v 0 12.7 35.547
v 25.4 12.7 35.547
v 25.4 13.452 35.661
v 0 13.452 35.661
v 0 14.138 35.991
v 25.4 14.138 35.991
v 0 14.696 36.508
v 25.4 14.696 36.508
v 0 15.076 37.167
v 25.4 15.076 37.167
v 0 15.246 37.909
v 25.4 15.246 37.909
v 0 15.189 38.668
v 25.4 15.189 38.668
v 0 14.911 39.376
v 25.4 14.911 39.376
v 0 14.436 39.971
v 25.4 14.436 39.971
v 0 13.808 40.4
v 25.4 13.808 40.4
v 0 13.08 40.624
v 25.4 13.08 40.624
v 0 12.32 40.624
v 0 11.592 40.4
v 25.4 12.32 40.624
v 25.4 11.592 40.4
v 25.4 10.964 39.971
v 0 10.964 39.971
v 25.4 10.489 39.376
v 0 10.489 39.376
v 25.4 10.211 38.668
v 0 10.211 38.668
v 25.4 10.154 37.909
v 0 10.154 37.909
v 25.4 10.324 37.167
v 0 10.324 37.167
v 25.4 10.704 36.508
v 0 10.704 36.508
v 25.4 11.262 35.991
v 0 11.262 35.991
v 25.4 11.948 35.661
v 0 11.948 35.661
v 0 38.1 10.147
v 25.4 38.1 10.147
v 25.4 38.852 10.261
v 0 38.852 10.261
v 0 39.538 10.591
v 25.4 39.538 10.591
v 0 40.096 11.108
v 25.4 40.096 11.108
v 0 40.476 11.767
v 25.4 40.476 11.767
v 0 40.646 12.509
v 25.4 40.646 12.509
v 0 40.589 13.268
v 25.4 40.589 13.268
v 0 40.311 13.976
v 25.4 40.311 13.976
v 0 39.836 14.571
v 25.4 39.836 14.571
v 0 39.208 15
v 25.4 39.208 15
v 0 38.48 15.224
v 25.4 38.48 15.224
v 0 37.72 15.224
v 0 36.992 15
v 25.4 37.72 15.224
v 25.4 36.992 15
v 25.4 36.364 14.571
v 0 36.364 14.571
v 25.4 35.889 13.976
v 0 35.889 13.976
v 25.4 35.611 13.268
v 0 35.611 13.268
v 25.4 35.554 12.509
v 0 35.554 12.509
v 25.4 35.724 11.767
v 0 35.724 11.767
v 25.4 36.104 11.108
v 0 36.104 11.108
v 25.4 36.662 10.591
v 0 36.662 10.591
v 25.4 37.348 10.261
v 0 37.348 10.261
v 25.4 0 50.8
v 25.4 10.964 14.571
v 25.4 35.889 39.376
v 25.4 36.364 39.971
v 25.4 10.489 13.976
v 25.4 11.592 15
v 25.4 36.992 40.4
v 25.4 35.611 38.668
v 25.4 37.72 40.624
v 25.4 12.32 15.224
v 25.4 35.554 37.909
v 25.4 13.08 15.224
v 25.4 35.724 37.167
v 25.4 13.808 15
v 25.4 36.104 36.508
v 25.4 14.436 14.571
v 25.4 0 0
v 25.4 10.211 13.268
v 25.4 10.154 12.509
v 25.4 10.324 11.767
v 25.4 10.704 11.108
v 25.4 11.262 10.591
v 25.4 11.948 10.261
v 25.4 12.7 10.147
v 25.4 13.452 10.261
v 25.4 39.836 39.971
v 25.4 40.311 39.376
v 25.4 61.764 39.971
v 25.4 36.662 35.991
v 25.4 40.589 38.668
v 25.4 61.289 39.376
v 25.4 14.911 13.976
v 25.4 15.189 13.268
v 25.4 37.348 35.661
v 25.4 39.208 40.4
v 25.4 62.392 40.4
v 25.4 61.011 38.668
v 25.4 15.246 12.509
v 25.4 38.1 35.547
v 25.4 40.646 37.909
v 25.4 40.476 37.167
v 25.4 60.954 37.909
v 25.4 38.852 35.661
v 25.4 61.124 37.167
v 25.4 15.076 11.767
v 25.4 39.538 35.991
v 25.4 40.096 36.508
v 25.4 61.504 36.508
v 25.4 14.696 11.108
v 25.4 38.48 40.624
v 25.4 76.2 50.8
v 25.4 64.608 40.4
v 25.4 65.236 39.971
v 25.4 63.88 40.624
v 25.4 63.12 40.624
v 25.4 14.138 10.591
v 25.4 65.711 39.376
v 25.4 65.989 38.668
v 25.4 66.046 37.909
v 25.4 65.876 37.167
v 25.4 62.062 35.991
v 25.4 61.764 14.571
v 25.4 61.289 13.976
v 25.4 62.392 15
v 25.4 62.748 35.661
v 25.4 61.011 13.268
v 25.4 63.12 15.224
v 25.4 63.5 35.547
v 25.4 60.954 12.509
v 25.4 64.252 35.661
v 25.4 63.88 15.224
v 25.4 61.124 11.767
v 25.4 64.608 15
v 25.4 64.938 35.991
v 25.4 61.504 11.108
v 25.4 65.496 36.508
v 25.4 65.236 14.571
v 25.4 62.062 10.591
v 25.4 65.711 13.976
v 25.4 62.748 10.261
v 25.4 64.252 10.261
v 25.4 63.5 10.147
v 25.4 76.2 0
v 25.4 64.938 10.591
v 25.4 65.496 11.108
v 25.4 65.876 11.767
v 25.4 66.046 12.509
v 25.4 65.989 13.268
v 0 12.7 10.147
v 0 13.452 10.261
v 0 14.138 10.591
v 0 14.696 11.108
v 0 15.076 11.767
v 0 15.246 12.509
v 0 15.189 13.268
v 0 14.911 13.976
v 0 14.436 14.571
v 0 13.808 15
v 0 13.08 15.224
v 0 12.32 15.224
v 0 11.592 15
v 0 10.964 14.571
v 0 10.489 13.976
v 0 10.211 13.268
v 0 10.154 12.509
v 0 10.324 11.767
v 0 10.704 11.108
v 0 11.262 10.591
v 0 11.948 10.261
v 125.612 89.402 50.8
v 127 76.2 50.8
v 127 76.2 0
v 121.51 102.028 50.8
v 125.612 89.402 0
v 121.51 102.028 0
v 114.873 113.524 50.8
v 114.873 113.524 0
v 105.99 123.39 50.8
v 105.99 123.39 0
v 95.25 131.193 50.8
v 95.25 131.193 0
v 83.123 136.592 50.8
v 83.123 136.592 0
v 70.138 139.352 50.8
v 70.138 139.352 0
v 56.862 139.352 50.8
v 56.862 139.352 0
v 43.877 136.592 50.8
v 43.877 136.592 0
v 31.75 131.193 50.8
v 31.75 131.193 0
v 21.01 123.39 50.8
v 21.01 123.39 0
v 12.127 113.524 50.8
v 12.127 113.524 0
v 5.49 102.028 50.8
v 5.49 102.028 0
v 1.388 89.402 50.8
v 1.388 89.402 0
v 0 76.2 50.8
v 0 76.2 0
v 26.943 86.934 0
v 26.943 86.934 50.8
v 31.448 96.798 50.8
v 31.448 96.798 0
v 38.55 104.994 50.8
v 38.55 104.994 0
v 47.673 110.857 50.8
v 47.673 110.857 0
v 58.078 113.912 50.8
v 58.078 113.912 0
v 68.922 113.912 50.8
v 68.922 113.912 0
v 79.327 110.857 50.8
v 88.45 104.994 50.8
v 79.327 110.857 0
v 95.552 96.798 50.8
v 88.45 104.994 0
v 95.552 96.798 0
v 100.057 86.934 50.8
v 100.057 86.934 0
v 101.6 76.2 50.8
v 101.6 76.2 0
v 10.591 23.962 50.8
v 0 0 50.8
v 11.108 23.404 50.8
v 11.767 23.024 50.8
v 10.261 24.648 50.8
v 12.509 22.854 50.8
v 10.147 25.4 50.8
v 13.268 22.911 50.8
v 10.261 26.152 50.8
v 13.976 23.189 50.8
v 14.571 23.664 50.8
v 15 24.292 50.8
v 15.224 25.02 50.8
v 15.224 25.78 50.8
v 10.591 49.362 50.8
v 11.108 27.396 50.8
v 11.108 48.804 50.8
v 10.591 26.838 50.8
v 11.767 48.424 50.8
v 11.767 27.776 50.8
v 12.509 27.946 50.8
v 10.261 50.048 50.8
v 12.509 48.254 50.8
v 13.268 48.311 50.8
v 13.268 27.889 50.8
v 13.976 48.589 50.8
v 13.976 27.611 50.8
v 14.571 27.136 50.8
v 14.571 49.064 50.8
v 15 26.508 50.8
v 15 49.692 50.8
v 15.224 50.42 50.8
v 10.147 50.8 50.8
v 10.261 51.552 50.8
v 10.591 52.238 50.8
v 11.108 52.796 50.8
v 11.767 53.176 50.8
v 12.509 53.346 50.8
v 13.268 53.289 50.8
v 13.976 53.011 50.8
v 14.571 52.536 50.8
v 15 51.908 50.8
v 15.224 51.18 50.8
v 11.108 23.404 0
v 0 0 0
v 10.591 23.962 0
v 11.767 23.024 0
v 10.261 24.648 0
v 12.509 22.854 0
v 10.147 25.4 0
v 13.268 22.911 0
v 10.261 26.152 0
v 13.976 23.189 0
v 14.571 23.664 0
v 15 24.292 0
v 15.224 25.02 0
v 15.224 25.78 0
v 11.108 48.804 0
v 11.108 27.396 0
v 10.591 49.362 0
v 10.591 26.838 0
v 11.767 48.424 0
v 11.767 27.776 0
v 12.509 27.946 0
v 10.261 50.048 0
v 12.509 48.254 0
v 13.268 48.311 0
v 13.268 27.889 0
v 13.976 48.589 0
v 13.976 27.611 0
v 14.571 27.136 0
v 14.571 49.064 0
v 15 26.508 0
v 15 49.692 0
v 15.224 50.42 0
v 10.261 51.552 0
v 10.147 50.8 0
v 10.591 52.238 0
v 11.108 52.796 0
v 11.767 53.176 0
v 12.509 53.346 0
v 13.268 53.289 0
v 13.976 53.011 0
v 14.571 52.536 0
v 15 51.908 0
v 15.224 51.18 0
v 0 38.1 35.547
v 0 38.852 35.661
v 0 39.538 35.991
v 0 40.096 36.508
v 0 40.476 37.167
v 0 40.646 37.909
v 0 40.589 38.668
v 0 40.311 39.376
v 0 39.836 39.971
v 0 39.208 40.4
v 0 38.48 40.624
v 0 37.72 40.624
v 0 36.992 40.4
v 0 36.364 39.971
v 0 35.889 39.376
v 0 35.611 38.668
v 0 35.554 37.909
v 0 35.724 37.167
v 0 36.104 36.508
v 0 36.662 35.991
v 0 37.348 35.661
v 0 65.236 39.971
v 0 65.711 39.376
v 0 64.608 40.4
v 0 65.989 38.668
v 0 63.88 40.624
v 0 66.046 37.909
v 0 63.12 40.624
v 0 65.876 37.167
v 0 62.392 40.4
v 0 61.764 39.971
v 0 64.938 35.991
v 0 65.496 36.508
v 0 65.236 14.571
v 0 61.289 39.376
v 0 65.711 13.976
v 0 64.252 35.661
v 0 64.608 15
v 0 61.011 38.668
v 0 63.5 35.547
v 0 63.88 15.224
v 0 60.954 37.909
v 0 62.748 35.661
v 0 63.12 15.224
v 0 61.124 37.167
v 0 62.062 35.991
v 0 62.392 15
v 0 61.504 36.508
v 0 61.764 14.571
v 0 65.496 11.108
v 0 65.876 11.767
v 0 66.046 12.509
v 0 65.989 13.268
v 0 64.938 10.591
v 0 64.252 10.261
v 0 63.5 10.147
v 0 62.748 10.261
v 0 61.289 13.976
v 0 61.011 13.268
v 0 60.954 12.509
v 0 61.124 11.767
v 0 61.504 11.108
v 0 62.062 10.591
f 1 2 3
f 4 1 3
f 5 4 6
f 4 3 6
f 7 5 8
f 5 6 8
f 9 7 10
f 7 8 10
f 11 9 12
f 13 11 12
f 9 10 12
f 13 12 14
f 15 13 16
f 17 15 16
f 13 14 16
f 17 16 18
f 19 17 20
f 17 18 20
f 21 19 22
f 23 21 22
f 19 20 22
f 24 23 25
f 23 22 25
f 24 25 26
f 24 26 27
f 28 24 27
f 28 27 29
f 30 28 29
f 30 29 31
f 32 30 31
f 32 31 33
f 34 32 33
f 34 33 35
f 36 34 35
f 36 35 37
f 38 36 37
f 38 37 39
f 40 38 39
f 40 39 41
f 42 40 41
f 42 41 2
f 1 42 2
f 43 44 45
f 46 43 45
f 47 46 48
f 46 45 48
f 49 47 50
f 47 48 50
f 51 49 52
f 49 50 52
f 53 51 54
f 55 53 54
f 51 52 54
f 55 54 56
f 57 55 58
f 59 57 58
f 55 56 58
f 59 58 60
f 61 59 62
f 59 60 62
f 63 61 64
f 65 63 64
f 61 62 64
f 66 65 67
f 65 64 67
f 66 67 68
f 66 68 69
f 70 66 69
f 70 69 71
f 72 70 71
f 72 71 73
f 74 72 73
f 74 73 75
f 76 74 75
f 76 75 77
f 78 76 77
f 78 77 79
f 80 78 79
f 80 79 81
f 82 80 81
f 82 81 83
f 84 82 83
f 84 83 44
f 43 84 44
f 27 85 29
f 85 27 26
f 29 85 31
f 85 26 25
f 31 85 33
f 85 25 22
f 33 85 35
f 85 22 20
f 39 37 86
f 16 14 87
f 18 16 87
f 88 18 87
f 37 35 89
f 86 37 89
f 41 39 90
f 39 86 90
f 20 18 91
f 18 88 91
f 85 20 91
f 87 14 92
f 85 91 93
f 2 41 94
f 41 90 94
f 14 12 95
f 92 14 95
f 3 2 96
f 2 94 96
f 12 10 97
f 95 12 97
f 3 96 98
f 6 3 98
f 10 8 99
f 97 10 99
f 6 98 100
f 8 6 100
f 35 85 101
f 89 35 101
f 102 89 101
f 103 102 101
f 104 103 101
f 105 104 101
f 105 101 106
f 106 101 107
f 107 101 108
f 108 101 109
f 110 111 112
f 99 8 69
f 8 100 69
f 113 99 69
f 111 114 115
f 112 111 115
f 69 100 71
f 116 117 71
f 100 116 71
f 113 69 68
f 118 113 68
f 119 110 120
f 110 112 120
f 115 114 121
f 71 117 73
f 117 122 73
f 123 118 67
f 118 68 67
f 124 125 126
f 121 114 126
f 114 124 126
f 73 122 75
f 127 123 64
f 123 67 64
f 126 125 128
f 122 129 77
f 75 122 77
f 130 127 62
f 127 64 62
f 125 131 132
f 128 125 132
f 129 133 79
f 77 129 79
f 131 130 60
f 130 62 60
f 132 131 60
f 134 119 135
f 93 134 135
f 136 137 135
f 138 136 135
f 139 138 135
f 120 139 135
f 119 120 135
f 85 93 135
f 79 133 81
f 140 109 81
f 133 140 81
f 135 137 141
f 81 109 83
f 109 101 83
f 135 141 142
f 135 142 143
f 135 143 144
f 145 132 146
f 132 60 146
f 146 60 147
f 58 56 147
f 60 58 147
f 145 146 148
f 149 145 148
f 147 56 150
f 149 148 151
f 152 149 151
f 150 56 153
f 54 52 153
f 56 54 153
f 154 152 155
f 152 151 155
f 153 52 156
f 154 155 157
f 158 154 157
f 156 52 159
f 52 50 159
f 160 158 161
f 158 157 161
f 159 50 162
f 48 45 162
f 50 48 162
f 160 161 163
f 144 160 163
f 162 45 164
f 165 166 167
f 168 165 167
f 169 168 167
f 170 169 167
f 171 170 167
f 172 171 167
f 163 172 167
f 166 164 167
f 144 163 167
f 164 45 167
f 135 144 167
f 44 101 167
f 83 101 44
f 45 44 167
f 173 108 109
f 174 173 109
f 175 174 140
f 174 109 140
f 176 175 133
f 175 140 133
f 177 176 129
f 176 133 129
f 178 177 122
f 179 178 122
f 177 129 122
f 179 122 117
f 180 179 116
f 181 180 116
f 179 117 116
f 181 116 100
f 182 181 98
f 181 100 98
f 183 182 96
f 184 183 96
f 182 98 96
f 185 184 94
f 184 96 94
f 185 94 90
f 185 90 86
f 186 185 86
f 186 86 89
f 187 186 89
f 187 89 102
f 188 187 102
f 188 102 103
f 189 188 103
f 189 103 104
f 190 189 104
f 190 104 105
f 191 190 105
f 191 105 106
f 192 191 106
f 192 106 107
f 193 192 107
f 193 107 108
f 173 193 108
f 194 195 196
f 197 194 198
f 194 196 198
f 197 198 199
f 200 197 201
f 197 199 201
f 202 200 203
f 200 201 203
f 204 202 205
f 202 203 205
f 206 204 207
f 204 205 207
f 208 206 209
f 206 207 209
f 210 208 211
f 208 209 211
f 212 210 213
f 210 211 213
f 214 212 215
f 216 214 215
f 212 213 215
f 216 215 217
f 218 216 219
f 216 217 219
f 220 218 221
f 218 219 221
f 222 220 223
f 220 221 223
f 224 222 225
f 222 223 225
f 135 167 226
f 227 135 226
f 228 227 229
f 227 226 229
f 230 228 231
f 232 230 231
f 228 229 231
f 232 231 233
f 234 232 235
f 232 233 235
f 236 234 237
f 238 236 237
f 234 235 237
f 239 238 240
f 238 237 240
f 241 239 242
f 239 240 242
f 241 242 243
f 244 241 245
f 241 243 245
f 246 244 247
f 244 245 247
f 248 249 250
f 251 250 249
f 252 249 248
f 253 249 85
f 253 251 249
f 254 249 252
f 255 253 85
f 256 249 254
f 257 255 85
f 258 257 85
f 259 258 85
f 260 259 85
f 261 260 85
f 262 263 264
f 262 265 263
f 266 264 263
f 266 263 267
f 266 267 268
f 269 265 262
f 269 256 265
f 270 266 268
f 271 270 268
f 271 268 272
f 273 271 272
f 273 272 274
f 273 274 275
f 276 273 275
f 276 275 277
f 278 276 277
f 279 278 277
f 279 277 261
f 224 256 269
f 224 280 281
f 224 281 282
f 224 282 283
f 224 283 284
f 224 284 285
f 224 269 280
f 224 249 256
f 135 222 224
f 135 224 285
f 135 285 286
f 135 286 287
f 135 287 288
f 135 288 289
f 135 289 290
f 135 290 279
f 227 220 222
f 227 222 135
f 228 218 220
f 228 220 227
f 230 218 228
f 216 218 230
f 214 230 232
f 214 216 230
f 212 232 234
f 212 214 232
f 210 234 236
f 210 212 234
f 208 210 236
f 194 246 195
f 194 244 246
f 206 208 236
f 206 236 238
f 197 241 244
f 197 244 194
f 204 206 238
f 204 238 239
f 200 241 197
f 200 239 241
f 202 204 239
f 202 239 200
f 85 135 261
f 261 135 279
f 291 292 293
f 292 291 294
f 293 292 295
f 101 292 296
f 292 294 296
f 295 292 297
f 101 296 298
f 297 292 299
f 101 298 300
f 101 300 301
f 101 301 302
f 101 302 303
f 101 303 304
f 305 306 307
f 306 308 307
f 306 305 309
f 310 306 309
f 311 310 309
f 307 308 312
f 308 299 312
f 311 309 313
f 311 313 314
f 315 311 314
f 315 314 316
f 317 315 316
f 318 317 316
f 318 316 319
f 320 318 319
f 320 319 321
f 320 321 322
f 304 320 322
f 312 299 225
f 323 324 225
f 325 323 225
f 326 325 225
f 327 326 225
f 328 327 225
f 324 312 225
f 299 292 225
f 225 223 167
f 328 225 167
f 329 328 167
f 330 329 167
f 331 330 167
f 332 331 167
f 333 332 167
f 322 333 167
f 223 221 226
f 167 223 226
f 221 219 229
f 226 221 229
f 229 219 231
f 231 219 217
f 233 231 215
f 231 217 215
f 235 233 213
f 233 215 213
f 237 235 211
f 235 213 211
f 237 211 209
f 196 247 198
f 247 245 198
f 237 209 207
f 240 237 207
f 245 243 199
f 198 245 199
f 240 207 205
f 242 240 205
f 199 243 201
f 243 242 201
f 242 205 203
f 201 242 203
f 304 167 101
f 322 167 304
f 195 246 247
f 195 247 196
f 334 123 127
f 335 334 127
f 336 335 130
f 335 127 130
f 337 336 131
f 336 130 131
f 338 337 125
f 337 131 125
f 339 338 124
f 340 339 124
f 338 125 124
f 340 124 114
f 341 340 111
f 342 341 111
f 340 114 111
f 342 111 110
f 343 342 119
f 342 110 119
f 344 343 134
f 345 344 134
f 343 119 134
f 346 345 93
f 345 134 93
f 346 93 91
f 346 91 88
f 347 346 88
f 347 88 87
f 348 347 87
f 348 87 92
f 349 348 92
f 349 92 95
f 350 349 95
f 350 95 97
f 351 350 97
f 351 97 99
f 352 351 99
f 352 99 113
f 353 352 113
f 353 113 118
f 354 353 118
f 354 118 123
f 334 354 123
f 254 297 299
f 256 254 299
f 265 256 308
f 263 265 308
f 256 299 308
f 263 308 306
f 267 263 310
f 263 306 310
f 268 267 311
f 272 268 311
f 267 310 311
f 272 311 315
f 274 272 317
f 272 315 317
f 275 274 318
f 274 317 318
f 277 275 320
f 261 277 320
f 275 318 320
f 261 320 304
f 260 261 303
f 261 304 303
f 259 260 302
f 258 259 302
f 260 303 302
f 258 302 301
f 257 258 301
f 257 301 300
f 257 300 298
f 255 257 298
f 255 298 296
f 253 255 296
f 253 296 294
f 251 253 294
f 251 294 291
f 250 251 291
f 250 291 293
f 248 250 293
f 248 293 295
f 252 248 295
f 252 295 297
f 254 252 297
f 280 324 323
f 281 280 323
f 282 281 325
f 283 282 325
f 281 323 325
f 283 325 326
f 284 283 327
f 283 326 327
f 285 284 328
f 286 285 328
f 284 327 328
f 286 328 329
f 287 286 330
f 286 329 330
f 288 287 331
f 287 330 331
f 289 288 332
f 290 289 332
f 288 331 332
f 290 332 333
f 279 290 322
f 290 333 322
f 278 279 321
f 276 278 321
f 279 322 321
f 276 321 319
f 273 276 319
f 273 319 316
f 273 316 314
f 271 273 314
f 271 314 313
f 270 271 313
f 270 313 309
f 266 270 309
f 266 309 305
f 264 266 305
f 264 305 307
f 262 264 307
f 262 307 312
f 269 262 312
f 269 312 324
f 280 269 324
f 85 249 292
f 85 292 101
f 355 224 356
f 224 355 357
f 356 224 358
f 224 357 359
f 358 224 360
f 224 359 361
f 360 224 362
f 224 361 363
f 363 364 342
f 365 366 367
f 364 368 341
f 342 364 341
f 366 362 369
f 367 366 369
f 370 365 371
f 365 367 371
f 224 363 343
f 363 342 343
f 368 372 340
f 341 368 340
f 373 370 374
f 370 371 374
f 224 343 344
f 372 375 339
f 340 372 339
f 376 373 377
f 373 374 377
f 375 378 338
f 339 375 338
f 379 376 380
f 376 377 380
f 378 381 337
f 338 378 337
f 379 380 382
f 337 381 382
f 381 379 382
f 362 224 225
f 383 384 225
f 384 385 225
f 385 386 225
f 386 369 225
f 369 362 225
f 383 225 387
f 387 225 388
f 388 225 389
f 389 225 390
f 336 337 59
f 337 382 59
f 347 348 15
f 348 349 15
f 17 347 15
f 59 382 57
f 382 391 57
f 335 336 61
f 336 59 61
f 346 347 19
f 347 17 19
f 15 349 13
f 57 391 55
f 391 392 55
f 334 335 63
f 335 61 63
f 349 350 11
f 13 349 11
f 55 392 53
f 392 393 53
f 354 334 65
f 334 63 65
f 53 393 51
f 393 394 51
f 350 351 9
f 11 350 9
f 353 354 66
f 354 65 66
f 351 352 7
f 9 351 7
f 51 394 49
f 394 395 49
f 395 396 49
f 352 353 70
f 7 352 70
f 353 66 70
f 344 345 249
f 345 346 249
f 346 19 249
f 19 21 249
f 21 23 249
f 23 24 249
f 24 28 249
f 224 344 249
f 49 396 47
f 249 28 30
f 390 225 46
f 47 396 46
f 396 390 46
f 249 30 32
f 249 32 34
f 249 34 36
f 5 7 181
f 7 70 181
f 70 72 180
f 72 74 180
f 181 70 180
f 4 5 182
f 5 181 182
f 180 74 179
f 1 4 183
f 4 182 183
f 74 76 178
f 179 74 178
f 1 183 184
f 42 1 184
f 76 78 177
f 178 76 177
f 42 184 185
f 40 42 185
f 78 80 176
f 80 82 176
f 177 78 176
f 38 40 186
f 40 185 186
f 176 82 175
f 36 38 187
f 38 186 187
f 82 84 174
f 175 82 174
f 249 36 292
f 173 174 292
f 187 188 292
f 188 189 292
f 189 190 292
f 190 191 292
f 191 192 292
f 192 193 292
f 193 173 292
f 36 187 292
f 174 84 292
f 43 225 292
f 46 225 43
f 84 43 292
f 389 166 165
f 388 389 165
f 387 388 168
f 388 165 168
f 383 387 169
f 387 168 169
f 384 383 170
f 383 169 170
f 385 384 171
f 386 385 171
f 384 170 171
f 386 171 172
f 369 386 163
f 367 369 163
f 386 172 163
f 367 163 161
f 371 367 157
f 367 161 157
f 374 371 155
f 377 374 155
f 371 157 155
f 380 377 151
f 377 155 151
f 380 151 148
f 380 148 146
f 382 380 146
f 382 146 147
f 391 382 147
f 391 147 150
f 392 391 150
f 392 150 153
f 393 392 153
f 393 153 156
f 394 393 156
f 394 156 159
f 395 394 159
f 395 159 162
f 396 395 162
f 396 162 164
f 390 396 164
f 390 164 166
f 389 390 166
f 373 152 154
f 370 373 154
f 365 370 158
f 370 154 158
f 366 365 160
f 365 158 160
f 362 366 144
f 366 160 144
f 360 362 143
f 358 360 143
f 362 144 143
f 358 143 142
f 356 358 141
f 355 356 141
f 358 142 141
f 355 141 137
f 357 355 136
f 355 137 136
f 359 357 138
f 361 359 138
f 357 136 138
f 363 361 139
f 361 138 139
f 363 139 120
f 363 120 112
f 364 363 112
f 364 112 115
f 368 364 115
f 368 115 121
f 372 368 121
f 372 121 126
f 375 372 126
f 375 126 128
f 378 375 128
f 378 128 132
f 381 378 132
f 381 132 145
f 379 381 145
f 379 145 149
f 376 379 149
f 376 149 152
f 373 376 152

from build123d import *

# Parameters (mm, degrees)
BOSS_EXTRUDE1_DEPTH    = 50.8
F_10_CLEARANCE_HOLE1_D = 5.1054
F_10_CLEARANCE_HOLE2_D = 5.1054


with BuildPart() as part:
    # Sketch1 → Boss-Extrude1 (new body)
    with BuildSketch(Plane.XY):
        with BuildLine():
            Line((101.6, 76.2), (127, 76.2))
            ThreePointArc((127, 76.2), (63.5, 139.7), (0, 76.2))
            Line((0, 76.2), (0, 0))
            Line((0, 0), (25.4, 0))
            Line((25.4, 0), (25.4, 76.2))
            ThreePointArc((25.4, 76.2), (63.5, 114.3), (101.6, 76.2))
        make_face()
    extrude(amount=BOSS_EXTRUDE1_DEPTH)

    # #10 Clearance Hole1 (through all)
    with Locations(Plane.XY.offset(50.8)):
        with Locations((12.7, 50.8), (12.7, 25.4)):
            Hole(F_10_CLEARANCE_HOLE1_D / 2)

    # #10 Clearance Hole2 (through all)
    with Locations(Plane.ZY):
        with Locations((12.7, 38.1), (12.7, 12.7), (12.7, 63.5), (38.1, 63.5), (38.1, 12.7), (38.1, 38.1)):
            Hole(F_10_CLEARANCE_HOLE2_D / 2)


solid = part.part
